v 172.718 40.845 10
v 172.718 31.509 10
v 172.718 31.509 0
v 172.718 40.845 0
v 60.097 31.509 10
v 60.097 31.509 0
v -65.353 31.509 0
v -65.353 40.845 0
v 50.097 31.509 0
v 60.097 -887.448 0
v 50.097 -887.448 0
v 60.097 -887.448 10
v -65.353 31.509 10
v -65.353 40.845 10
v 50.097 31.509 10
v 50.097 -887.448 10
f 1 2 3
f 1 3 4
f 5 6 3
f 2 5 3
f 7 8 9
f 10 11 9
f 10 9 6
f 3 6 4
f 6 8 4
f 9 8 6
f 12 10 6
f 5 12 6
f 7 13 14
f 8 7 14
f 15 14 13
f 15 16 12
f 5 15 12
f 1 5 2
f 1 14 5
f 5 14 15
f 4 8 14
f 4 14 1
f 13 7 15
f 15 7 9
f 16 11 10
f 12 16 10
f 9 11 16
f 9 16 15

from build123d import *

# Parameters (mm, degrees)
SKETCH_1_W      = 238.070236771
SKETCH_1_H      = 9.336087717
SKETCH_1_W_2    = 10
SKETCH_1_H_2    = 918.957046125
EXTRUDE_1_DEPTH = 10


with BuildPart() as part:
    # Эскиз1 → Бобышка-Вытянуть1 (new body)
    with BuildSketch(Plane.XY):
        with Locations((53.68250437, 36.177339902)):
            Rectangle(SKETCH_1_W, SKETCH_1_H)
        with Locations((55.096797899, -427.96922702)):
            Rectangle(SKETCH_1_W_2, SKETCH_1_H_2)
    extrude(amount=EXTRUDE_1_DEPTH)


solid = part.part
